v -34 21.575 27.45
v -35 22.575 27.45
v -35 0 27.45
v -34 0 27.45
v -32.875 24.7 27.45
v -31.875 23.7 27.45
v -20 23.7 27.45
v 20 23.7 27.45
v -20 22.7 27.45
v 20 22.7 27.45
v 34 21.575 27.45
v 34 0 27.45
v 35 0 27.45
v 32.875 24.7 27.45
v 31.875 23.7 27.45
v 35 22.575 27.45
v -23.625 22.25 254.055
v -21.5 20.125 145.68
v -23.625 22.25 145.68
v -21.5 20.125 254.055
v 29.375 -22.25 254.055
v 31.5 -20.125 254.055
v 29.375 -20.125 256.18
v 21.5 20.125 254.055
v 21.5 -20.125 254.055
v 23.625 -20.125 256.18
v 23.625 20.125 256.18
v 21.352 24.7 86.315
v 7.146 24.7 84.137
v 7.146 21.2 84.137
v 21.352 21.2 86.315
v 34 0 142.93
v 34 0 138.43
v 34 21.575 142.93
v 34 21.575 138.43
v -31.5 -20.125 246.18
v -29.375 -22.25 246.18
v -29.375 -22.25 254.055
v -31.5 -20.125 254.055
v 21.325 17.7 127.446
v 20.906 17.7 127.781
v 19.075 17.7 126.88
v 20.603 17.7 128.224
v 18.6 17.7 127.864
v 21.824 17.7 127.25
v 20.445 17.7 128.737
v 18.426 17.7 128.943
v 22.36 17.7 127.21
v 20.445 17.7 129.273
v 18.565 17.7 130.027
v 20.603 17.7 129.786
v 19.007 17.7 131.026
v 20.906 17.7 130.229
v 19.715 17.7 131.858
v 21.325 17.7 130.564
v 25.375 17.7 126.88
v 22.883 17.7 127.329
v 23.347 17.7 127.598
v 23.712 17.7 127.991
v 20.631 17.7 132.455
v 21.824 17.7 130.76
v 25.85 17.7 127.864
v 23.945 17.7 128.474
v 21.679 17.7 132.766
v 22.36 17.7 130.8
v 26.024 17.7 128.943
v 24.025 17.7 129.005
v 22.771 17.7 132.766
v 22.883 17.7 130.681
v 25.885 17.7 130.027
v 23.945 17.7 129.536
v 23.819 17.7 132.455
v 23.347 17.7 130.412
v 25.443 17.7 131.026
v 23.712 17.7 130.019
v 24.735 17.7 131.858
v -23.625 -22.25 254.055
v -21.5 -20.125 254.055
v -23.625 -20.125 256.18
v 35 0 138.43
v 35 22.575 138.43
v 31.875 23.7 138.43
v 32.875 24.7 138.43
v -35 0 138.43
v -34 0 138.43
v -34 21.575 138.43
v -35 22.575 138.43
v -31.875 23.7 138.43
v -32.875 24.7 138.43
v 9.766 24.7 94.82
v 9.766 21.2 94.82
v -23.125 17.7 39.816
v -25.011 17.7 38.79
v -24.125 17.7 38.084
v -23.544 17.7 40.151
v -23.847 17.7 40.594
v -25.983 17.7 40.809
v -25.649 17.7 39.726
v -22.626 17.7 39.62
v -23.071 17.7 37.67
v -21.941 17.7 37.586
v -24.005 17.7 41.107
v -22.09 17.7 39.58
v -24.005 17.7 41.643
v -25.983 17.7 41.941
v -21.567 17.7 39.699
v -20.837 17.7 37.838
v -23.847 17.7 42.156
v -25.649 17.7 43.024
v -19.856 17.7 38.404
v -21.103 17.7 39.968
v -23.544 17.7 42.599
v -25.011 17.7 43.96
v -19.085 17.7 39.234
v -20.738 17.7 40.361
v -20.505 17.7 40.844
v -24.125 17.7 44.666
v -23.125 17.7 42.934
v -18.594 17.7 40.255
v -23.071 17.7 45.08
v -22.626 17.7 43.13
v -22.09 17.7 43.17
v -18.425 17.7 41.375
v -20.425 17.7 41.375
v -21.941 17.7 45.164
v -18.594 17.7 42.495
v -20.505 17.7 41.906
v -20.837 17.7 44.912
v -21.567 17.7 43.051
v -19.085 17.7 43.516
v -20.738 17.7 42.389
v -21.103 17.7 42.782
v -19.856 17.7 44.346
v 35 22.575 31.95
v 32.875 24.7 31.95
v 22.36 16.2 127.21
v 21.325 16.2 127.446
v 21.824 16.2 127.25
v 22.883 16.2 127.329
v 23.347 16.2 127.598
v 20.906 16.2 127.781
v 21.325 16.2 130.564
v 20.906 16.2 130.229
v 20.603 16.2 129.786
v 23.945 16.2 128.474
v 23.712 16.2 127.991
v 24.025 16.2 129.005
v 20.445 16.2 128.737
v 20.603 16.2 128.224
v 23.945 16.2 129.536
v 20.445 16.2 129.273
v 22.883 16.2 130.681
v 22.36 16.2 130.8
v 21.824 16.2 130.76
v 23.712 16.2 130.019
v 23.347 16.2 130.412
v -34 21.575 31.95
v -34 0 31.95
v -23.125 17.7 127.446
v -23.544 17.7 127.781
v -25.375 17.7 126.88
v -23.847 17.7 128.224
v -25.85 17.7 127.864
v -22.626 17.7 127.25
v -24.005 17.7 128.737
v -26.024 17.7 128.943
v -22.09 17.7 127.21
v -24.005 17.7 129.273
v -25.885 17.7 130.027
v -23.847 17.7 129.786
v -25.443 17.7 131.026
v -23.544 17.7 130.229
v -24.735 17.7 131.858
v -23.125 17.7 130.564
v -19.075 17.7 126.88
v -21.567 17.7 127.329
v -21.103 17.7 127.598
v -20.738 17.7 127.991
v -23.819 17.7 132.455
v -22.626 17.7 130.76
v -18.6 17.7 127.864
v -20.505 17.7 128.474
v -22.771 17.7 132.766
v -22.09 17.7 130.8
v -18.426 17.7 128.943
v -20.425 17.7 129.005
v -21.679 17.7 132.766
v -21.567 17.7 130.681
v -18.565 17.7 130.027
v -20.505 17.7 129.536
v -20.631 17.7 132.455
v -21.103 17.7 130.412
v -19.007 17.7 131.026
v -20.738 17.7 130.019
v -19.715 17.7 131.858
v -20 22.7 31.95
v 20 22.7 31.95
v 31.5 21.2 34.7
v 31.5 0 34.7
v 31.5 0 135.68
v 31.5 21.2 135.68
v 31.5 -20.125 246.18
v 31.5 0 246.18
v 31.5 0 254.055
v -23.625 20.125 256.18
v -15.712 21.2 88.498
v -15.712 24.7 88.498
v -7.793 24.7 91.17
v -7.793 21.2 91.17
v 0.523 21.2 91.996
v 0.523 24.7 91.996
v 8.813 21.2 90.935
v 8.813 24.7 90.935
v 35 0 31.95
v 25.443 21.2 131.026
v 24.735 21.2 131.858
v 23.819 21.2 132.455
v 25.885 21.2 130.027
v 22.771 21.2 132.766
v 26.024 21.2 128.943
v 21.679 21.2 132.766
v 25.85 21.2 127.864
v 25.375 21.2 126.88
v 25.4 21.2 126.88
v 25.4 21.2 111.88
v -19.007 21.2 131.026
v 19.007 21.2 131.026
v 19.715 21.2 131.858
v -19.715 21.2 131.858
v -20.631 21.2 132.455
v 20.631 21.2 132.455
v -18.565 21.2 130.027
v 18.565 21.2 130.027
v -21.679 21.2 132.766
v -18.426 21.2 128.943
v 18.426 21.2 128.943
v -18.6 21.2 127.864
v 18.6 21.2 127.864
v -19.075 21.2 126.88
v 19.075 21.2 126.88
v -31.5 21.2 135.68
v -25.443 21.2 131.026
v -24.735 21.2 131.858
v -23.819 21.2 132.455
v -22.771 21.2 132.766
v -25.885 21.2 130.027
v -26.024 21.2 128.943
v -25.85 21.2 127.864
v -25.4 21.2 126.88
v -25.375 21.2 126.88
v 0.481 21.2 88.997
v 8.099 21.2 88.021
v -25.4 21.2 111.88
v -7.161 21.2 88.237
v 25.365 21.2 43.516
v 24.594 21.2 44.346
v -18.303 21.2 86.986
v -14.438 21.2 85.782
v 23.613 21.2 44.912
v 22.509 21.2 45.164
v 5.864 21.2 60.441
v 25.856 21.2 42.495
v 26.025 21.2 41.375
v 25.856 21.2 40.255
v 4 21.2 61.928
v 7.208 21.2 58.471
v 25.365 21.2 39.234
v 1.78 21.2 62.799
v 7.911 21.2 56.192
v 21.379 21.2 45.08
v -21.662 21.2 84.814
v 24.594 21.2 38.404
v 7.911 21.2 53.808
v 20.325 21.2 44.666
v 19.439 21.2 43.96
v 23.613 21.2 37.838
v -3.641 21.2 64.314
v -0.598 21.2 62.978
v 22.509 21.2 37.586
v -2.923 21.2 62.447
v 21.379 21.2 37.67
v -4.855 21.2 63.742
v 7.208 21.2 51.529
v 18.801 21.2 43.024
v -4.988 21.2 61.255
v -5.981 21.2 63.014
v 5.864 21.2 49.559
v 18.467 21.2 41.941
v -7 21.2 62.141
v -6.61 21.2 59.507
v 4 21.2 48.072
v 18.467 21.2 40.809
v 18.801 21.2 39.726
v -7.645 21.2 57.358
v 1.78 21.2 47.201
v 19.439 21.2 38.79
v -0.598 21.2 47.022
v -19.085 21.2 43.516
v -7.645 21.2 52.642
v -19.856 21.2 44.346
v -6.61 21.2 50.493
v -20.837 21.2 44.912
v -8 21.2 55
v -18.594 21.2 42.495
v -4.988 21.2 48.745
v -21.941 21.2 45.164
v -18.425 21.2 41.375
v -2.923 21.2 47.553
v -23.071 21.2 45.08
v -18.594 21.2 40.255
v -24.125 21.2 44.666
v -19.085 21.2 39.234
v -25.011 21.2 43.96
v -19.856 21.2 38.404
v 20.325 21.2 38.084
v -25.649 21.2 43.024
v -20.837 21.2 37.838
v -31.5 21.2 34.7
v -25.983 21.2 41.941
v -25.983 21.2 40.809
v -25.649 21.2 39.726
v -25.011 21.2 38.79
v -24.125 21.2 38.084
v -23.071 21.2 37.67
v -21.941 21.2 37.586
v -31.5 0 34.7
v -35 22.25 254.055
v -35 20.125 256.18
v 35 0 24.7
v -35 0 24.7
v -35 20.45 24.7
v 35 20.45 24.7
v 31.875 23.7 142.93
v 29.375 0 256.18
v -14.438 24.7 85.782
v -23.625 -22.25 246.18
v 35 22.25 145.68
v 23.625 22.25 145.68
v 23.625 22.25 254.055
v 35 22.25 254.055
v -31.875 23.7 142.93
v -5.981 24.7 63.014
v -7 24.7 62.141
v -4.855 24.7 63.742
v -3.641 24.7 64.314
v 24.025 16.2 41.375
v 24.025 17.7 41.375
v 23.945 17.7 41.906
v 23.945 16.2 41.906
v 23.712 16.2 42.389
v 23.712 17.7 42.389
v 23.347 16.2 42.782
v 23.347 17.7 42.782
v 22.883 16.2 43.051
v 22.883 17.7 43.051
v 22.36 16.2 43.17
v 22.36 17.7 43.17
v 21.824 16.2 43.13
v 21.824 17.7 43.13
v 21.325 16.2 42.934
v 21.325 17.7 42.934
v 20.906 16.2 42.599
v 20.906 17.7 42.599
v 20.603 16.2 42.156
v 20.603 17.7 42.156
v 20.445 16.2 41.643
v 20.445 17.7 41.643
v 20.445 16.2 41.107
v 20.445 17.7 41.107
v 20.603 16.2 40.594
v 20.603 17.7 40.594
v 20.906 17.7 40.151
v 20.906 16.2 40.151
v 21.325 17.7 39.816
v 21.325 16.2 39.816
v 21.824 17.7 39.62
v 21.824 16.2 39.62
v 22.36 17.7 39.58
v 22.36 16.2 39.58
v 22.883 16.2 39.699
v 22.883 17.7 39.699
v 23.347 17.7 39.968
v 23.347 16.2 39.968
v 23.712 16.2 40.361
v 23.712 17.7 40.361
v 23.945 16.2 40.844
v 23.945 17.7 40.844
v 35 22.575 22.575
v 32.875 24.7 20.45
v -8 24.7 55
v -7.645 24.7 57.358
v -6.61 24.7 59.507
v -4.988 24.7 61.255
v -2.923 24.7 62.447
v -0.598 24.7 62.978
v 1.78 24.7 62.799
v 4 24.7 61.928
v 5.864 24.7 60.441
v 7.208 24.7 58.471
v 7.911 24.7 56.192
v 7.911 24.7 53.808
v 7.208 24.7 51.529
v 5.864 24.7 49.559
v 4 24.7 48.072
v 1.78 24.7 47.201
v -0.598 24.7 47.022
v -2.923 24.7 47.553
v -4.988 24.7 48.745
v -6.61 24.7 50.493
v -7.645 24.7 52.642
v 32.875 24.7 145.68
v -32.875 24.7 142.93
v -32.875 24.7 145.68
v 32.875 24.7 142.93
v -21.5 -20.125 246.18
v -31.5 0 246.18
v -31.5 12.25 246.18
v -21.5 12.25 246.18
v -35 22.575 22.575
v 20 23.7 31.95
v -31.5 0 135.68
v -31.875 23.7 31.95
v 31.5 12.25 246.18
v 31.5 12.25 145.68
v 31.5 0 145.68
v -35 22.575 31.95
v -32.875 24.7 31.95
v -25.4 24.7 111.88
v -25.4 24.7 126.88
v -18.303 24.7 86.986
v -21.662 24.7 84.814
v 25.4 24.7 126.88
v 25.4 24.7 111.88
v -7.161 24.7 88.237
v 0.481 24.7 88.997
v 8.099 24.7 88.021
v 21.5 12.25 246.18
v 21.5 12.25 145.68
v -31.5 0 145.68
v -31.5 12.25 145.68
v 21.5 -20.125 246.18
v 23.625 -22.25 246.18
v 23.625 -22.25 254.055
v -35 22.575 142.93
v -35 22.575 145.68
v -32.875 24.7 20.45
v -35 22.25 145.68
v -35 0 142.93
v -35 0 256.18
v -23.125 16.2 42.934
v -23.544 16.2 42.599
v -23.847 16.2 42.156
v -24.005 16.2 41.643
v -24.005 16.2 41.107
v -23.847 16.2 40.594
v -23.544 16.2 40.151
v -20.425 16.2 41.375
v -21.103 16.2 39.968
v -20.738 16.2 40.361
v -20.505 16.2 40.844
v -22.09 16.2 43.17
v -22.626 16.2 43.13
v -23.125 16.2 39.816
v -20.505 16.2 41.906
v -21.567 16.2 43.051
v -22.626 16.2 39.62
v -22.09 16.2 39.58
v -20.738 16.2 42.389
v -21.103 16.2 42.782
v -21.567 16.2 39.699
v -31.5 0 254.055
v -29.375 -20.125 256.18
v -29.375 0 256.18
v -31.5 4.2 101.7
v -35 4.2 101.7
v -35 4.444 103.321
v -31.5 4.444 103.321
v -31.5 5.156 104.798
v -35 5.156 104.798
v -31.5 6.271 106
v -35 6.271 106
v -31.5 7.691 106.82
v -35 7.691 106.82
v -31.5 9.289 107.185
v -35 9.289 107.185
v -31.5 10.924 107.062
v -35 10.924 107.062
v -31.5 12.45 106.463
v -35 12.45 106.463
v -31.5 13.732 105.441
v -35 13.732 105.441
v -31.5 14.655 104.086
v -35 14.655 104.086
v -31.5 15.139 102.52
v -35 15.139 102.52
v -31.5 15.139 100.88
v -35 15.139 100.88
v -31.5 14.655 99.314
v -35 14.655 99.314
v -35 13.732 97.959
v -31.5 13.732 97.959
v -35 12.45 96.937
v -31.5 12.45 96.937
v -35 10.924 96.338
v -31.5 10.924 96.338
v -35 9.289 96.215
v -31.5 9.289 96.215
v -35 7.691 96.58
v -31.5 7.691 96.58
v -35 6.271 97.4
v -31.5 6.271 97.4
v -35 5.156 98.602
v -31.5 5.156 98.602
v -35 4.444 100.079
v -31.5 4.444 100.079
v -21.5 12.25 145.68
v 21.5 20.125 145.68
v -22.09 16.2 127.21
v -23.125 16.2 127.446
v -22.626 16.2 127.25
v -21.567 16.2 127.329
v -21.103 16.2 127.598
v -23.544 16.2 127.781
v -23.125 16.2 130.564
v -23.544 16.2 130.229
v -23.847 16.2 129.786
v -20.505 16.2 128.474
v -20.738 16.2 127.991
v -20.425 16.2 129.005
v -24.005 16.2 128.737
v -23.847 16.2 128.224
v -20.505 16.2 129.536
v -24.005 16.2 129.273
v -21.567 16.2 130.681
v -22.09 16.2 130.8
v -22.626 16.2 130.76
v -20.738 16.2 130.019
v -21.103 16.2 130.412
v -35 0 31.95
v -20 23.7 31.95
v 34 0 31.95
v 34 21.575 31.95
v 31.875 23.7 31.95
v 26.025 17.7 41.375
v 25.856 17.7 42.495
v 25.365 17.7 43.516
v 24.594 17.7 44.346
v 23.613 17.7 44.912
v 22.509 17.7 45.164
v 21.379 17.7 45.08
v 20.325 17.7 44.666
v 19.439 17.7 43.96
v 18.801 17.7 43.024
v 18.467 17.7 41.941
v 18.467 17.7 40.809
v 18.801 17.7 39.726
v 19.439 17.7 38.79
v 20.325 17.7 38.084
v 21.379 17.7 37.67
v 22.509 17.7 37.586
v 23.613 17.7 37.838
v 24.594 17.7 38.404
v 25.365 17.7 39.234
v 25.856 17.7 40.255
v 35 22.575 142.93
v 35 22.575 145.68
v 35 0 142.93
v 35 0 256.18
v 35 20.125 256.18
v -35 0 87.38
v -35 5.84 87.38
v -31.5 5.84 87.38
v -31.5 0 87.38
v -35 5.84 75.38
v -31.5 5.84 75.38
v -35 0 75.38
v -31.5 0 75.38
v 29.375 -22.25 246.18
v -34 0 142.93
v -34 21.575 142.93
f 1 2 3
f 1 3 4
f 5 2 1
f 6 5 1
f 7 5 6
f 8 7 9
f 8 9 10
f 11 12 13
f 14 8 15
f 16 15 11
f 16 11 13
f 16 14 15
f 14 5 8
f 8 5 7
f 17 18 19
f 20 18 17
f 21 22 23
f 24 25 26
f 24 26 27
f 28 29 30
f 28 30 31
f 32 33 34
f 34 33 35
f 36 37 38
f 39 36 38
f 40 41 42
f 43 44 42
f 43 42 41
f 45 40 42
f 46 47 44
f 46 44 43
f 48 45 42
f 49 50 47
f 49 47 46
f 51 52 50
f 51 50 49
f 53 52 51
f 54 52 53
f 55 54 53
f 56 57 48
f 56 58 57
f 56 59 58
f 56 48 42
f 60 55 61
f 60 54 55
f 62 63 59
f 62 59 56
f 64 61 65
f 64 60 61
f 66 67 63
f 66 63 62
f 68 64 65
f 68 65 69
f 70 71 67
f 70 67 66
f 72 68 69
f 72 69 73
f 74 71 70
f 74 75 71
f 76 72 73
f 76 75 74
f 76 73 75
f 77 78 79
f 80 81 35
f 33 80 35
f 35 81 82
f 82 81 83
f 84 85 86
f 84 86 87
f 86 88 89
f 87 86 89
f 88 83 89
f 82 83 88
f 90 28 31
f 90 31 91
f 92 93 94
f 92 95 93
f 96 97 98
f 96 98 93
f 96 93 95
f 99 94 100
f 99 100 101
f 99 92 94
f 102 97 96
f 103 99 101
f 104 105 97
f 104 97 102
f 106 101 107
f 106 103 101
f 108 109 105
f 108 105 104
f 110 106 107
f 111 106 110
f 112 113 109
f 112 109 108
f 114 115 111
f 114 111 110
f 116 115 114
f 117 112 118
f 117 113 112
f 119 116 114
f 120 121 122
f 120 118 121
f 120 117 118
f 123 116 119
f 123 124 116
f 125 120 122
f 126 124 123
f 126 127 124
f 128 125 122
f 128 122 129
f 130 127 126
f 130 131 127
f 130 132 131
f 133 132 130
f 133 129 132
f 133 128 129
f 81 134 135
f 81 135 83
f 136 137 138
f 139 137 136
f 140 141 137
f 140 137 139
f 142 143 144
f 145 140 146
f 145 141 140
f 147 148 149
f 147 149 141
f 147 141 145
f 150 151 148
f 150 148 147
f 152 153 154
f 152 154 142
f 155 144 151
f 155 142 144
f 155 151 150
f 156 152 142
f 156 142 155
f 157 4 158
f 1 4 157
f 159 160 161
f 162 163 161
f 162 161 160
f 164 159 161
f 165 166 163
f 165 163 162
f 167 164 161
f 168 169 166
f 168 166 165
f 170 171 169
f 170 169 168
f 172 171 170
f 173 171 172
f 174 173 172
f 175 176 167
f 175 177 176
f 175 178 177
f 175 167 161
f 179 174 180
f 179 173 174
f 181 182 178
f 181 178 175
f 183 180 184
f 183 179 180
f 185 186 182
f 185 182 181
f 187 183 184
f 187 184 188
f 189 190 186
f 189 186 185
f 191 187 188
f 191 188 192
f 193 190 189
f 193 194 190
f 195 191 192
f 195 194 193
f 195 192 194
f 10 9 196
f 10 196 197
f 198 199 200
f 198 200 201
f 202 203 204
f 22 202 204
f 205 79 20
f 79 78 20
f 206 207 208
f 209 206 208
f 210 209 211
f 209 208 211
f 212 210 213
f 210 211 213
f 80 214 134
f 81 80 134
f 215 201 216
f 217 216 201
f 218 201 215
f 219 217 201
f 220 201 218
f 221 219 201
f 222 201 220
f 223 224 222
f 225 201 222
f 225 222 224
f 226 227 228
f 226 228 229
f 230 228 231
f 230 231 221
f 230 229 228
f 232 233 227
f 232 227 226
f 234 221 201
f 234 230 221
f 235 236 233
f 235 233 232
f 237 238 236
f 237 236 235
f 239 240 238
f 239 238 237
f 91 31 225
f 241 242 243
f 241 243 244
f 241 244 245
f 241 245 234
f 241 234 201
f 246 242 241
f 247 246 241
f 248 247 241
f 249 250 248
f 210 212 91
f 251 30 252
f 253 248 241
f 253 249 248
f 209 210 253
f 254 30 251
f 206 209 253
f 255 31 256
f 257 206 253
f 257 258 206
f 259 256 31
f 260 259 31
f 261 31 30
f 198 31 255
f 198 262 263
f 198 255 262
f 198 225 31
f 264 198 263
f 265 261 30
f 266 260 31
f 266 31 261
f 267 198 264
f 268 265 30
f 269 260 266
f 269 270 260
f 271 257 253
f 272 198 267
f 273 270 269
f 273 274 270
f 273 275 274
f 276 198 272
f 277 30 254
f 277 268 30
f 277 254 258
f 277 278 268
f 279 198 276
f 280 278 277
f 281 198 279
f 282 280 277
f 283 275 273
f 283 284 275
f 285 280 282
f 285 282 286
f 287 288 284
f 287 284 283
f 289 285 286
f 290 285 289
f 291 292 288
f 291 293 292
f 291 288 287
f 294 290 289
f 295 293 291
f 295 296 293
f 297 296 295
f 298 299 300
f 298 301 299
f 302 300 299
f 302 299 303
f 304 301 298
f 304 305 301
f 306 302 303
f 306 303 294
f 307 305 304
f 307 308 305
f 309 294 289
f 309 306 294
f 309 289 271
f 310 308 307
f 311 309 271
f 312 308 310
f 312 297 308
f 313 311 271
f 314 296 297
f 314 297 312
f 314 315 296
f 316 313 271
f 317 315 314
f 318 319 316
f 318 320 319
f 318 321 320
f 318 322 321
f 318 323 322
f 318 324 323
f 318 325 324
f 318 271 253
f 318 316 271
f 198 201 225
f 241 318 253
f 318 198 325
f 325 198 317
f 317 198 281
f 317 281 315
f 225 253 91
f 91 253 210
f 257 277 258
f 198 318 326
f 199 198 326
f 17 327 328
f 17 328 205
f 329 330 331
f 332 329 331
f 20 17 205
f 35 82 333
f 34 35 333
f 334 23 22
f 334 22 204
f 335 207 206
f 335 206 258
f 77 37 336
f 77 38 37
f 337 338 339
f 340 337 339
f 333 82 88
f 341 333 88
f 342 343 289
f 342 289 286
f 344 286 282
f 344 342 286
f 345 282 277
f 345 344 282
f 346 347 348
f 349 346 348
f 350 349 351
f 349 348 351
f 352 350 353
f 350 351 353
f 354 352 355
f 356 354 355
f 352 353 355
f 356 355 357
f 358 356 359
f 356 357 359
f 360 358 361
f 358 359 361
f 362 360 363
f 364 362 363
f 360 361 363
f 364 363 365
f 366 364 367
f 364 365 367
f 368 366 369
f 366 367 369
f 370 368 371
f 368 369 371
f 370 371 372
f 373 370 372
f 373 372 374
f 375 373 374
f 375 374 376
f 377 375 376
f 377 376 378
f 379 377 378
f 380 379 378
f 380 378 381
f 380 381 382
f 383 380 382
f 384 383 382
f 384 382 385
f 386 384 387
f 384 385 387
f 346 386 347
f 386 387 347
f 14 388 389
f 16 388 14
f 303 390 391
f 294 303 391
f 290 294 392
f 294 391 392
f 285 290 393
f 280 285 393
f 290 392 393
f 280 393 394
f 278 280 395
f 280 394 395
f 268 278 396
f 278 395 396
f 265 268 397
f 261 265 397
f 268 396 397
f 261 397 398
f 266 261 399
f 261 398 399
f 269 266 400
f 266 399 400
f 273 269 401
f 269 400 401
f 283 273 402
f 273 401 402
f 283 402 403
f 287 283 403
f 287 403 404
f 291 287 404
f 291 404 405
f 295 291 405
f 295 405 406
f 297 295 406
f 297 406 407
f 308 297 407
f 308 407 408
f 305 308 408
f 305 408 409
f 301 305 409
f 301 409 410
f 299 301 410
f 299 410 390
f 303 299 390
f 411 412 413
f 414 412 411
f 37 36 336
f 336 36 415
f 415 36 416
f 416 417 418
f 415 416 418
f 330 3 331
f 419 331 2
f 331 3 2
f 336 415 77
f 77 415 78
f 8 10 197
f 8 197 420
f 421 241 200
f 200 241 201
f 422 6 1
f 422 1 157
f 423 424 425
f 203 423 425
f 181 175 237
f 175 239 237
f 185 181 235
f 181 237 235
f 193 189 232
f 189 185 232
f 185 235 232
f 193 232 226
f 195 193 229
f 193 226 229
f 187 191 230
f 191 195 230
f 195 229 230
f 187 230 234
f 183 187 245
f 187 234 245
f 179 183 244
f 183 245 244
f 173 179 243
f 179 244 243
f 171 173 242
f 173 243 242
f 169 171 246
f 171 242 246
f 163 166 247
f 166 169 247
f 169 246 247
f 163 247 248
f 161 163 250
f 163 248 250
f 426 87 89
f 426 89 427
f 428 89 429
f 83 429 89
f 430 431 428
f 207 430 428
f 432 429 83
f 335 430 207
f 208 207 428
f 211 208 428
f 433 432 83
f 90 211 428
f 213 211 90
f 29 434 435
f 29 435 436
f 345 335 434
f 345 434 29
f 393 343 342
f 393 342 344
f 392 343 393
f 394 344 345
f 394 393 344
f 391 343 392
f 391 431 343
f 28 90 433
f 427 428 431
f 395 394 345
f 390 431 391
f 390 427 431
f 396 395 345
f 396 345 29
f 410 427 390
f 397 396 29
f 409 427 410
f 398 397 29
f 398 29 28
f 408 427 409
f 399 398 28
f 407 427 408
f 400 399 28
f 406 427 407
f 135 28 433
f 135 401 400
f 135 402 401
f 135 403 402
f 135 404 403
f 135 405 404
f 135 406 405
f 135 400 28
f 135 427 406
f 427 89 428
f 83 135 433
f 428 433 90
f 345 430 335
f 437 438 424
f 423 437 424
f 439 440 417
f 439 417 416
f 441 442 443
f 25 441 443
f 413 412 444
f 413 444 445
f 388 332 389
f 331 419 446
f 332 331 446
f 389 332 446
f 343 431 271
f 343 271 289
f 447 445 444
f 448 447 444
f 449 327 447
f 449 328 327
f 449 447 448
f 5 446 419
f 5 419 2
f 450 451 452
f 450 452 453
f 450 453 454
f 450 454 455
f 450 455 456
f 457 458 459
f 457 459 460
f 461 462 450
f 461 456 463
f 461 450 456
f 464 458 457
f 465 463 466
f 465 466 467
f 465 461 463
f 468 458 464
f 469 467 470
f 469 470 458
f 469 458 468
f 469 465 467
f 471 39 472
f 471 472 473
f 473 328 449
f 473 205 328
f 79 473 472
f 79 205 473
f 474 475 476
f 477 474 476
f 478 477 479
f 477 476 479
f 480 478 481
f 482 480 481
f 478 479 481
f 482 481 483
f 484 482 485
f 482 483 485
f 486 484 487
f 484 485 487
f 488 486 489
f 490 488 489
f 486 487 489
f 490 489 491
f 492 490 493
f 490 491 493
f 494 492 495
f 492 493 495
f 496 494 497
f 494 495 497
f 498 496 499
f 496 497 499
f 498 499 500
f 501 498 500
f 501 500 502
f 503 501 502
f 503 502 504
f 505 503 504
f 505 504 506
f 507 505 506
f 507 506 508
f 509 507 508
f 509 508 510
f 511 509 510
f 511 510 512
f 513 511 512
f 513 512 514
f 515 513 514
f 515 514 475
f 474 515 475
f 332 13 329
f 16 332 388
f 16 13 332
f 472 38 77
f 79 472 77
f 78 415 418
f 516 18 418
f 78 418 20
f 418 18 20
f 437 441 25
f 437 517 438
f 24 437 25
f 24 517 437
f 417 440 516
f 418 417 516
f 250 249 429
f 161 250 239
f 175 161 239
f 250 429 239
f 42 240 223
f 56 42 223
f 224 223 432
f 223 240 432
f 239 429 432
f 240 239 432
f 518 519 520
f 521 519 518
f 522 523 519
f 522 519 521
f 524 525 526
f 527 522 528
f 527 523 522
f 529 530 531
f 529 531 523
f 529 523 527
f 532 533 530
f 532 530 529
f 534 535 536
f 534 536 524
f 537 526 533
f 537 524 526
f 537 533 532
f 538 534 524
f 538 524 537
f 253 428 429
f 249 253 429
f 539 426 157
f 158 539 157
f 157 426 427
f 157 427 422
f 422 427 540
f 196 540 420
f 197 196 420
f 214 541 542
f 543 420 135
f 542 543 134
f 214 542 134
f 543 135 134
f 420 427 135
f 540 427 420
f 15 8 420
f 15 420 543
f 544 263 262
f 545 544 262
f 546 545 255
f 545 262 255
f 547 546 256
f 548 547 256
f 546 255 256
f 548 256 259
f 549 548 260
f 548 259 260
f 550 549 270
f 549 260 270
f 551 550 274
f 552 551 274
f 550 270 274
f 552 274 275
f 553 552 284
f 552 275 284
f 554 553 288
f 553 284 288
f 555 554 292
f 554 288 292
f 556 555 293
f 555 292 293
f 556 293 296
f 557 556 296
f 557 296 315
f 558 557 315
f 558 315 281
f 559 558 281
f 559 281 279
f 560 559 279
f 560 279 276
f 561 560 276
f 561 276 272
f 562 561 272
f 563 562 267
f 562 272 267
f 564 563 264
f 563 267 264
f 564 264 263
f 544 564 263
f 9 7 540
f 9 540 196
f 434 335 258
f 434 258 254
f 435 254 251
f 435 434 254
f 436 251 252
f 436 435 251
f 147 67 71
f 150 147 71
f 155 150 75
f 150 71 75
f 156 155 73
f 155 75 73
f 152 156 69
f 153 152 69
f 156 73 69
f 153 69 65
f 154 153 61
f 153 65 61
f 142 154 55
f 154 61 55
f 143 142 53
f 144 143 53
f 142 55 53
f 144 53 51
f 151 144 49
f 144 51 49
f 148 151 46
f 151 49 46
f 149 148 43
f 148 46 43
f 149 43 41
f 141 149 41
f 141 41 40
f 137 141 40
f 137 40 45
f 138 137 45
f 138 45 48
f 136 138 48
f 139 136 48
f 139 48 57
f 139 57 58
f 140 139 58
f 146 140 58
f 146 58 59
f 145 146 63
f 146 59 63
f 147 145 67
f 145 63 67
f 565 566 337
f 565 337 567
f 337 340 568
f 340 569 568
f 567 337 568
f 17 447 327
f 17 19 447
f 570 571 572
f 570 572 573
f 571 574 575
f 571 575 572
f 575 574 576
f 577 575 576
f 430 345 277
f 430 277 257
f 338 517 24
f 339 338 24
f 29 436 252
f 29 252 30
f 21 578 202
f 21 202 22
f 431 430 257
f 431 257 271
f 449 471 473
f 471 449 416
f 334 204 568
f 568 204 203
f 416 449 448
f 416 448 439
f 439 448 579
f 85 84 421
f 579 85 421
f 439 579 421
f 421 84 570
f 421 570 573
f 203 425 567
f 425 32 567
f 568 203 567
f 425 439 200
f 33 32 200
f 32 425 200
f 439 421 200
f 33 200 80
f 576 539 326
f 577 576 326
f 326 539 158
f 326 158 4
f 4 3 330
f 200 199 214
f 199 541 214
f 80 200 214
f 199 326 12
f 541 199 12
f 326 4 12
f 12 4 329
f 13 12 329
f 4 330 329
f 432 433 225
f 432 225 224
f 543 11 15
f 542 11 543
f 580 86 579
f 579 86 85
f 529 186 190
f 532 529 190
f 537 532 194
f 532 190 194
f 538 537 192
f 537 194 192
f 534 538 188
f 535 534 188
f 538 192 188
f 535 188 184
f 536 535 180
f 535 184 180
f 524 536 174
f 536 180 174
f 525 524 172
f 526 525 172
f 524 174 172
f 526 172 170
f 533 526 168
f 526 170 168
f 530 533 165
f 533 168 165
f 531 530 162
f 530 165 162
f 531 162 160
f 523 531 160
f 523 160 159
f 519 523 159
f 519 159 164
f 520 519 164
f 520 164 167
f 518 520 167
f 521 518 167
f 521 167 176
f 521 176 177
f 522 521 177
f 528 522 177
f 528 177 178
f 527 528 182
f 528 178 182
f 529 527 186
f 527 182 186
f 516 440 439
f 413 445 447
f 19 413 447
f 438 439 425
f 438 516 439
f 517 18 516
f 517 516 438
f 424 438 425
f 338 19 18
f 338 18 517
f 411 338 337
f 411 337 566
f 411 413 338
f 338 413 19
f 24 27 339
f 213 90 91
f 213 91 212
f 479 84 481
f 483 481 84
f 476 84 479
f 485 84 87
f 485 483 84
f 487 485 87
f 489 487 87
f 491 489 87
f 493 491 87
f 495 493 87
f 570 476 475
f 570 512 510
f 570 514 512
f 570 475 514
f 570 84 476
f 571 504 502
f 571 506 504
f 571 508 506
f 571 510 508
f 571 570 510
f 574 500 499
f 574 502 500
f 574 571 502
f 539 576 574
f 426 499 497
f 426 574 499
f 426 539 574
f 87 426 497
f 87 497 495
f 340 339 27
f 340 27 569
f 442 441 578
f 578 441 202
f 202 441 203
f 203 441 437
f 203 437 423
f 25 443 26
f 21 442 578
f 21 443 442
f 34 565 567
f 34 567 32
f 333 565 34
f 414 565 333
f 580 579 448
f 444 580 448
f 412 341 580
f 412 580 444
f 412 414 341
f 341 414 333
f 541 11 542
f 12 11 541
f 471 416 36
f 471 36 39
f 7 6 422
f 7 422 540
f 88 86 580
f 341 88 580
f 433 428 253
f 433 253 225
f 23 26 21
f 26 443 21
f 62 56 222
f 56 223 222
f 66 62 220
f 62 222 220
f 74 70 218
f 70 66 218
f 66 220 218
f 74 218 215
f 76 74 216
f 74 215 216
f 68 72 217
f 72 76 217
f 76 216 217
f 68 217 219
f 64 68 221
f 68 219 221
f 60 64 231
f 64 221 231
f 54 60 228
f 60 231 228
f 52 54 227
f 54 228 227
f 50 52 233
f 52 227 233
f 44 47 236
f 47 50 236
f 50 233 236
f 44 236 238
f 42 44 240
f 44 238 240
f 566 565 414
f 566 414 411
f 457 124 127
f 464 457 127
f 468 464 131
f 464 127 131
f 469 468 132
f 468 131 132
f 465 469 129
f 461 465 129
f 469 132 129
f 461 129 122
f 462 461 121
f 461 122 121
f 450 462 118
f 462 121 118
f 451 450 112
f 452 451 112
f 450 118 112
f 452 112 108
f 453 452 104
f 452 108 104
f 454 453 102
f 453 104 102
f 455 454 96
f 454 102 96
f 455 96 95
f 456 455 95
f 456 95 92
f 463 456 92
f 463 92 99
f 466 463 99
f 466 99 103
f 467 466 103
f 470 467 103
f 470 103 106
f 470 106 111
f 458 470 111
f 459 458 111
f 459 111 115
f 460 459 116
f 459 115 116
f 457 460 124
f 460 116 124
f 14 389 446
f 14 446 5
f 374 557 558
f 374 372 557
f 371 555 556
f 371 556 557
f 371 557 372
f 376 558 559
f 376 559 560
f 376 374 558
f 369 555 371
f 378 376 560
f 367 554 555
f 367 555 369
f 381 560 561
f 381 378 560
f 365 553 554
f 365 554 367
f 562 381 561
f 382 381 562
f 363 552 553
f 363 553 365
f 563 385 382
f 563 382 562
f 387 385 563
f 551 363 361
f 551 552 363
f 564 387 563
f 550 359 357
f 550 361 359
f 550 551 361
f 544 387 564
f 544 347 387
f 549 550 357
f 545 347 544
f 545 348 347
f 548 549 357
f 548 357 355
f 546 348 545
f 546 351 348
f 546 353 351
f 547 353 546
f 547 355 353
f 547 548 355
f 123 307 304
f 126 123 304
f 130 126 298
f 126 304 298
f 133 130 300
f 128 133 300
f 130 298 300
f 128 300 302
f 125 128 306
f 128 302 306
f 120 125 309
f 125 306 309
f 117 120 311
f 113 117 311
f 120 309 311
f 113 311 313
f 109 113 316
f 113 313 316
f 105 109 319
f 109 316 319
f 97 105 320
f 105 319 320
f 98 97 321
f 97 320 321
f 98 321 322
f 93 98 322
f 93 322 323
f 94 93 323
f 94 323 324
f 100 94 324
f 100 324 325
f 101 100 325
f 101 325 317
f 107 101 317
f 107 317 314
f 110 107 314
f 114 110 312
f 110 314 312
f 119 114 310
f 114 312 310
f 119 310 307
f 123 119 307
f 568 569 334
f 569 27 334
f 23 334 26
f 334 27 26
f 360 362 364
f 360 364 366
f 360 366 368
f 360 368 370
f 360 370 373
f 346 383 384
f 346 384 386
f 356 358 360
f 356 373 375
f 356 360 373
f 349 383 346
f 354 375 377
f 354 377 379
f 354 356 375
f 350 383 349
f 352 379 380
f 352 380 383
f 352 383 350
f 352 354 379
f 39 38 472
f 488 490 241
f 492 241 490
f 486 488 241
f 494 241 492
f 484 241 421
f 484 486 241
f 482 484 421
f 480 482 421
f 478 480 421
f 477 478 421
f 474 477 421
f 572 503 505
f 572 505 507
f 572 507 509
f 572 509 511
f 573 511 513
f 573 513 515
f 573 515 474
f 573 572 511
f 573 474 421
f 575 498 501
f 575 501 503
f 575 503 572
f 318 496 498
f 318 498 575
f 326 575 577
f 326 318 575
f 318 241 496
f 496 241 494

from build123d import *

# Parameters (mm, degrees)
PAD017_DEPTH    = 4.5
SKETCH028_W     = 50.8
SKETCH028_H     = 15
PAD024_DEPTH    = 10
PAD021_DEPTH    = 100.98
SKETCH025_R     = 3.8
PAD022_DEPTH    = 3.5
SKETCH026_R     = 1.8
PAD023_DEPTH    = 1.5
SKETCH042_R     = 8
POCKET002_DEPTH = 5
PAD031_DEPTH    = 4.5
SKETCH034_W     = 70
SKETCH034_H     = 24.7
PAD030_DEPTH    = 10
SKETCH037_W     = 10
SKETCH037_H     = 10
PAD033_DEPTH    = 110.5
SKETCH038_W     = 10
SKETCH038_H     = 10
PAD034_DEPTH    = 34.5
SKETCH039_W     = 10
SKETCH039_H     = 10
PAD035_DEPTH    = 34.5
SKETCH040_W     = 22.25
SKETCH040_H     = 110.5
PAD036_DEPTH    = 3.5
PAD016_DEPTH    = 70
CHAMFER010_SIZE = 2.125
CHAMFER012_SIZE = 2.125
SKETCH044_R     = 5.5
SKETCH044_W     = 7
SKETCH044_H     = 12
POCKET004_DEPTH = 5


with BuildPart() as band2:
    # Sketch020 → Pad017 (new body)
    with BuildSketch(Plane.XY.offset(27.45)):
        Polygon((-35, 24.7), (-35, 0), (-34, 0), (-34, 23.7), (-20, 23.7), (-20, 22.7), (20, 22.7), (20, 23.7), (34, 23.7), (34, 0), (35, 0), (35, 24.7), align=None)
    extrude(amount=PAD017_DEPTH)


with BuildPart() as body012:
    # Sketch028 → Pad024 (new body)
    with BuildSketch(Plane.XZ.offset(-24.7)):
        with Locations((0, 119.38)):
            Rectangle(SKETCH028_W, SKETCH028_H)
    extrude(amount=PAD024_DEPTH)


with BuildPart() as boardbacking:
    # Sketch024 → Pad021 (new body)
    with BuildSketch(Plane.XY.offset(34.7)):
        Polygon((-35, 0), (-35, 24.7), (35, 24.7), (35, 0), (31.5, 0), (31.5, 21.2), (-31.5, 21.2), (-31.5, 0), align=None)
    extrude(amount=PAD021_DEPTH)

    # Sketch025 (on Face6 of Pad021) → Pad022 (join)
    with BuildSketch(Plane.XZ.offset(-21.2)):
        with Locations((-22.225, 129.005)):
            Circle(SKETCH025_R)
        with Locations((22.225, 129.005)):
            Circle(SKETCH025_R)
        with Locations((-22.225, 41.375)):
            Circle(SKETCH025_R)
        with Locations((22.225, 41.375)):
            Circle(SKETCH025_R)
    extrude(amount=PAD022_DEPTH)

    # Sketch026 → Pad023 (join)
    with BuildSketch(Plane.XZ.offset(-17.7)):
        with Locations((-22.225, 129.005)):
            Circle(SKETCH026_R)
        with Locations((22.225, 129.005)):
            Circle(SKETCH026_R)
        with Locations((-22.225, 41.375)):
            Circle(SKETCH026_R)
        with Locations((22.225, 41.375)):
            Circle(SKETCH026_R)
    extrude(amount=PAD023_DEPTH)

    # Boolean005: cut Body012
    add(body012.part, mode=Mode.SUBTRACT)

    # Sketch042 (on Face3 of Boolean005) → Pocket002 (cut)
    with BuildSketch(Plane(origin=(0, 24.7, 0), x_dir=(-1, 0, 0), z_dir=(0, 1, 0))):
        with Locations((0, 55)):
            Circle(SKETCH042_R)
        with BuildLine():
            Line((3.641143, 64.313543), (18.302914, 86.985827))
            Line((18.302914, 86.985827), (21.661771, 84.813713))
            Line((21.661771, 84.813713), (7, 62.141428))
            ThreePointArc((7, 62.141428), (5.430286, 63.397142), (3.641143, 64.313543))
        make_face()
        with BuildLine():
            ThreePointArc((15.712042, 88.498235), (3.658274, 91.818705), (-8.813211, 90.935043))
            Line((-9.765986, 94.819914), (-8.813211, 90.935043))
            Line((-21.351919, 86.31544), (-9.765986, 94.819914))
            Line((-7.145856, 84.136519), (-21.351919, 86.31544))
            Line((-8.098631, 88.02139), (-7.145856, 84.136519))
            ThreePointArc((14.438081, 85.782167), (3.361649, 88.833405), (-8.098631, 88.02139))
            Line((15.712042, 88.498235), (14.438081, 85.782167))
        make_face()
    extrude(amount=-POCKET002_DEPTH, mode=Mode.SUBTRACT)


with BuildPart() as body017:
    # Sketch035 → Pad031 (new body)
    with BuildSketch(Plane.XY.offset(138.43)):
        Polygon((-35, 0), (-35, 24.7), (35, 24.7), (35, 0), (34, 0), (34, 23.7), (-34, 23.7), (-34, 0), align=None)
    extrude(amount=PAD031_DEPTH)


with BuildPart() as zip003:
    # Sketch034 → Pad030 (new body)
    with BuildSketch(Plane.XY.offset(135.68)):
        with Locations((0, 12.35)):
            Rectangle(SKETCH034_W, SKETCH034_H)
    extrude(amount=PAD030_DEPTH)

    # Boolean007: cut Body017
    add(body017.part, mode=Mode.SUBTRACT)

    # Sketch037 (on Face12 of Boolean007) → Pad033 (join)
    with BuildSketch(Plane.XY.offset(145.68)):
        with Locations((-26.5, 17.25)):
            Rectangle(SKETCH037_W, SKETCH037_H)
        with Locations((26.5, 17.25)):
            Rectangle(SKETCH037_W, SKETCH037_H)
    extrude(amount=PAD033_DEPTH)

    # Sketch038 (on Face21 of Pad033) → Pad034 (join)
    with BuildSketch(Plane.XZ.offset(-12.25)):
        with Locations((-26.5, 251.18)):
            Rectangle(SKETCH038_W, SKETCH038_H)
    extrude(amount=PAD034_DEPTH)

    # Sketch039 (on Face17 of Pad034) → Pad035 (join)
    with BuildSketch(Plane.XZ.offset(-12.25)):
        with Locations((26.5, 251.18)):
            Rectangle(SKETCH039_W, SKETCH039_H)
    extrude(amount=PAD035_DEPTH)

    # Sketch040 (on Face22 of Pad035) → Pad036 (join)
    with BuildSketch(Plane(origin=(-31.5, 0, 0), x_dir=(0, -1, 0), z_dir=(-1, 0, 0))):
        with Locations((-11.125, 200.93)):
            Rectangle(SKETCH040_W, SKETCH040_H)
    pad036 = extrude(amount=PAD036_DEPTH)

    # Mirrored: Pad036 across YZ
    add(pad036.mirror(Plane.YZ))


with BuildPart() as frame:
    # Sketch019 → Pad016 (new body)
    with BuildSketch(Plane.YZ.offset(-35)):
        Polygon((0, 34.7), (0, 24.7), (20.45, 24.7), (24.7, 20.45), (24.7, 34.7), align=None)
    extrude(amount=PAD016_DEPTH)

    # Boolean004: cut Band2
    add(band2.part, mode=Mode.SUBTRACT)

    # Boolean008: union BoardBacking, Zip003
    add(boardbacking.part)
    add(zip003.part)

    # Chamfer010
    chamfer010_edges = [frame.edges().sort_by_distance(p)[0] for p in [
        (35, 24.7, 23.95),
        (34, 23.7, 29.7),
        (35, 24.7, 33.325),
        (35, 24.7, 85.19),
        (35, 24.7, 137.055),
        (34, 23.7, 140.68),
        (35, 24.7, 144.305),
        (-35, 24.7, 144.305),
        (-34, 23.7, 140.68),
        (-35, 24.7, 137.055),
        (-35, 24.7, 85.19),
        (-35, 24.7, 33.325),
        (-34, 23.7, 29.7),
        (-35, 24.7, 23.95),
    ]]
    chamfer(chamfer010_edges, length=CHAMFER010_SIZE)

    # Chamfer012
    chamfer012_edges = [frame.edges().sort_by_distance(p)[0] for p in [
        (31.5, -22.25, 251.18),
        (31.5, -11.125, 256.18),
        (26.5, -22.25, 256.18),
        (21.5, -22.25, 251.18),
        (21.5, -5, 256.18),
        (21.5, 17.25, 256.18),
        (26.5, 22.25, 256.18),
        (33.25, 22.25, 256.18),
        (21.5, 22.25, 200.93),
        (-21.5, 22.25, 200.93),
        (-26.5, 22.25, 256.18),
        (-33.25, 22.25, 256.18),
        (-21.5, 17.25, 256.18),
        (-21.5, -5, 256.18),
        (-21.5, -22.25, 251.18),
        (-31.5, -22.25, 251.18),
        (-26.5, -22.25, 256.18),
        (-31.5, -11.125, 256.18),
    ]]
    chamfer(chamfer012_edges, length=CHAMFER012_SIZE)

    # Sketch044 (on Face54 of Chamfer012) → Pocket004 (cut)
    with BuildSketch(Plane(origin=(-35, 0, 0), x_dir=(0, -1, 0), z_dir=(-1, 0, 0))):
        with Locations((-9.7, 101.7)):
            Circle(SKETCH044_R)
        with Locations((-2.34, 81.38)):
            Rectangle(SKETCH044_W, SKETCH044_H)
    extrude(amount=-POCKET004_DEPTH, mode=Mode.SUBTRACT)


solid = frame.part
